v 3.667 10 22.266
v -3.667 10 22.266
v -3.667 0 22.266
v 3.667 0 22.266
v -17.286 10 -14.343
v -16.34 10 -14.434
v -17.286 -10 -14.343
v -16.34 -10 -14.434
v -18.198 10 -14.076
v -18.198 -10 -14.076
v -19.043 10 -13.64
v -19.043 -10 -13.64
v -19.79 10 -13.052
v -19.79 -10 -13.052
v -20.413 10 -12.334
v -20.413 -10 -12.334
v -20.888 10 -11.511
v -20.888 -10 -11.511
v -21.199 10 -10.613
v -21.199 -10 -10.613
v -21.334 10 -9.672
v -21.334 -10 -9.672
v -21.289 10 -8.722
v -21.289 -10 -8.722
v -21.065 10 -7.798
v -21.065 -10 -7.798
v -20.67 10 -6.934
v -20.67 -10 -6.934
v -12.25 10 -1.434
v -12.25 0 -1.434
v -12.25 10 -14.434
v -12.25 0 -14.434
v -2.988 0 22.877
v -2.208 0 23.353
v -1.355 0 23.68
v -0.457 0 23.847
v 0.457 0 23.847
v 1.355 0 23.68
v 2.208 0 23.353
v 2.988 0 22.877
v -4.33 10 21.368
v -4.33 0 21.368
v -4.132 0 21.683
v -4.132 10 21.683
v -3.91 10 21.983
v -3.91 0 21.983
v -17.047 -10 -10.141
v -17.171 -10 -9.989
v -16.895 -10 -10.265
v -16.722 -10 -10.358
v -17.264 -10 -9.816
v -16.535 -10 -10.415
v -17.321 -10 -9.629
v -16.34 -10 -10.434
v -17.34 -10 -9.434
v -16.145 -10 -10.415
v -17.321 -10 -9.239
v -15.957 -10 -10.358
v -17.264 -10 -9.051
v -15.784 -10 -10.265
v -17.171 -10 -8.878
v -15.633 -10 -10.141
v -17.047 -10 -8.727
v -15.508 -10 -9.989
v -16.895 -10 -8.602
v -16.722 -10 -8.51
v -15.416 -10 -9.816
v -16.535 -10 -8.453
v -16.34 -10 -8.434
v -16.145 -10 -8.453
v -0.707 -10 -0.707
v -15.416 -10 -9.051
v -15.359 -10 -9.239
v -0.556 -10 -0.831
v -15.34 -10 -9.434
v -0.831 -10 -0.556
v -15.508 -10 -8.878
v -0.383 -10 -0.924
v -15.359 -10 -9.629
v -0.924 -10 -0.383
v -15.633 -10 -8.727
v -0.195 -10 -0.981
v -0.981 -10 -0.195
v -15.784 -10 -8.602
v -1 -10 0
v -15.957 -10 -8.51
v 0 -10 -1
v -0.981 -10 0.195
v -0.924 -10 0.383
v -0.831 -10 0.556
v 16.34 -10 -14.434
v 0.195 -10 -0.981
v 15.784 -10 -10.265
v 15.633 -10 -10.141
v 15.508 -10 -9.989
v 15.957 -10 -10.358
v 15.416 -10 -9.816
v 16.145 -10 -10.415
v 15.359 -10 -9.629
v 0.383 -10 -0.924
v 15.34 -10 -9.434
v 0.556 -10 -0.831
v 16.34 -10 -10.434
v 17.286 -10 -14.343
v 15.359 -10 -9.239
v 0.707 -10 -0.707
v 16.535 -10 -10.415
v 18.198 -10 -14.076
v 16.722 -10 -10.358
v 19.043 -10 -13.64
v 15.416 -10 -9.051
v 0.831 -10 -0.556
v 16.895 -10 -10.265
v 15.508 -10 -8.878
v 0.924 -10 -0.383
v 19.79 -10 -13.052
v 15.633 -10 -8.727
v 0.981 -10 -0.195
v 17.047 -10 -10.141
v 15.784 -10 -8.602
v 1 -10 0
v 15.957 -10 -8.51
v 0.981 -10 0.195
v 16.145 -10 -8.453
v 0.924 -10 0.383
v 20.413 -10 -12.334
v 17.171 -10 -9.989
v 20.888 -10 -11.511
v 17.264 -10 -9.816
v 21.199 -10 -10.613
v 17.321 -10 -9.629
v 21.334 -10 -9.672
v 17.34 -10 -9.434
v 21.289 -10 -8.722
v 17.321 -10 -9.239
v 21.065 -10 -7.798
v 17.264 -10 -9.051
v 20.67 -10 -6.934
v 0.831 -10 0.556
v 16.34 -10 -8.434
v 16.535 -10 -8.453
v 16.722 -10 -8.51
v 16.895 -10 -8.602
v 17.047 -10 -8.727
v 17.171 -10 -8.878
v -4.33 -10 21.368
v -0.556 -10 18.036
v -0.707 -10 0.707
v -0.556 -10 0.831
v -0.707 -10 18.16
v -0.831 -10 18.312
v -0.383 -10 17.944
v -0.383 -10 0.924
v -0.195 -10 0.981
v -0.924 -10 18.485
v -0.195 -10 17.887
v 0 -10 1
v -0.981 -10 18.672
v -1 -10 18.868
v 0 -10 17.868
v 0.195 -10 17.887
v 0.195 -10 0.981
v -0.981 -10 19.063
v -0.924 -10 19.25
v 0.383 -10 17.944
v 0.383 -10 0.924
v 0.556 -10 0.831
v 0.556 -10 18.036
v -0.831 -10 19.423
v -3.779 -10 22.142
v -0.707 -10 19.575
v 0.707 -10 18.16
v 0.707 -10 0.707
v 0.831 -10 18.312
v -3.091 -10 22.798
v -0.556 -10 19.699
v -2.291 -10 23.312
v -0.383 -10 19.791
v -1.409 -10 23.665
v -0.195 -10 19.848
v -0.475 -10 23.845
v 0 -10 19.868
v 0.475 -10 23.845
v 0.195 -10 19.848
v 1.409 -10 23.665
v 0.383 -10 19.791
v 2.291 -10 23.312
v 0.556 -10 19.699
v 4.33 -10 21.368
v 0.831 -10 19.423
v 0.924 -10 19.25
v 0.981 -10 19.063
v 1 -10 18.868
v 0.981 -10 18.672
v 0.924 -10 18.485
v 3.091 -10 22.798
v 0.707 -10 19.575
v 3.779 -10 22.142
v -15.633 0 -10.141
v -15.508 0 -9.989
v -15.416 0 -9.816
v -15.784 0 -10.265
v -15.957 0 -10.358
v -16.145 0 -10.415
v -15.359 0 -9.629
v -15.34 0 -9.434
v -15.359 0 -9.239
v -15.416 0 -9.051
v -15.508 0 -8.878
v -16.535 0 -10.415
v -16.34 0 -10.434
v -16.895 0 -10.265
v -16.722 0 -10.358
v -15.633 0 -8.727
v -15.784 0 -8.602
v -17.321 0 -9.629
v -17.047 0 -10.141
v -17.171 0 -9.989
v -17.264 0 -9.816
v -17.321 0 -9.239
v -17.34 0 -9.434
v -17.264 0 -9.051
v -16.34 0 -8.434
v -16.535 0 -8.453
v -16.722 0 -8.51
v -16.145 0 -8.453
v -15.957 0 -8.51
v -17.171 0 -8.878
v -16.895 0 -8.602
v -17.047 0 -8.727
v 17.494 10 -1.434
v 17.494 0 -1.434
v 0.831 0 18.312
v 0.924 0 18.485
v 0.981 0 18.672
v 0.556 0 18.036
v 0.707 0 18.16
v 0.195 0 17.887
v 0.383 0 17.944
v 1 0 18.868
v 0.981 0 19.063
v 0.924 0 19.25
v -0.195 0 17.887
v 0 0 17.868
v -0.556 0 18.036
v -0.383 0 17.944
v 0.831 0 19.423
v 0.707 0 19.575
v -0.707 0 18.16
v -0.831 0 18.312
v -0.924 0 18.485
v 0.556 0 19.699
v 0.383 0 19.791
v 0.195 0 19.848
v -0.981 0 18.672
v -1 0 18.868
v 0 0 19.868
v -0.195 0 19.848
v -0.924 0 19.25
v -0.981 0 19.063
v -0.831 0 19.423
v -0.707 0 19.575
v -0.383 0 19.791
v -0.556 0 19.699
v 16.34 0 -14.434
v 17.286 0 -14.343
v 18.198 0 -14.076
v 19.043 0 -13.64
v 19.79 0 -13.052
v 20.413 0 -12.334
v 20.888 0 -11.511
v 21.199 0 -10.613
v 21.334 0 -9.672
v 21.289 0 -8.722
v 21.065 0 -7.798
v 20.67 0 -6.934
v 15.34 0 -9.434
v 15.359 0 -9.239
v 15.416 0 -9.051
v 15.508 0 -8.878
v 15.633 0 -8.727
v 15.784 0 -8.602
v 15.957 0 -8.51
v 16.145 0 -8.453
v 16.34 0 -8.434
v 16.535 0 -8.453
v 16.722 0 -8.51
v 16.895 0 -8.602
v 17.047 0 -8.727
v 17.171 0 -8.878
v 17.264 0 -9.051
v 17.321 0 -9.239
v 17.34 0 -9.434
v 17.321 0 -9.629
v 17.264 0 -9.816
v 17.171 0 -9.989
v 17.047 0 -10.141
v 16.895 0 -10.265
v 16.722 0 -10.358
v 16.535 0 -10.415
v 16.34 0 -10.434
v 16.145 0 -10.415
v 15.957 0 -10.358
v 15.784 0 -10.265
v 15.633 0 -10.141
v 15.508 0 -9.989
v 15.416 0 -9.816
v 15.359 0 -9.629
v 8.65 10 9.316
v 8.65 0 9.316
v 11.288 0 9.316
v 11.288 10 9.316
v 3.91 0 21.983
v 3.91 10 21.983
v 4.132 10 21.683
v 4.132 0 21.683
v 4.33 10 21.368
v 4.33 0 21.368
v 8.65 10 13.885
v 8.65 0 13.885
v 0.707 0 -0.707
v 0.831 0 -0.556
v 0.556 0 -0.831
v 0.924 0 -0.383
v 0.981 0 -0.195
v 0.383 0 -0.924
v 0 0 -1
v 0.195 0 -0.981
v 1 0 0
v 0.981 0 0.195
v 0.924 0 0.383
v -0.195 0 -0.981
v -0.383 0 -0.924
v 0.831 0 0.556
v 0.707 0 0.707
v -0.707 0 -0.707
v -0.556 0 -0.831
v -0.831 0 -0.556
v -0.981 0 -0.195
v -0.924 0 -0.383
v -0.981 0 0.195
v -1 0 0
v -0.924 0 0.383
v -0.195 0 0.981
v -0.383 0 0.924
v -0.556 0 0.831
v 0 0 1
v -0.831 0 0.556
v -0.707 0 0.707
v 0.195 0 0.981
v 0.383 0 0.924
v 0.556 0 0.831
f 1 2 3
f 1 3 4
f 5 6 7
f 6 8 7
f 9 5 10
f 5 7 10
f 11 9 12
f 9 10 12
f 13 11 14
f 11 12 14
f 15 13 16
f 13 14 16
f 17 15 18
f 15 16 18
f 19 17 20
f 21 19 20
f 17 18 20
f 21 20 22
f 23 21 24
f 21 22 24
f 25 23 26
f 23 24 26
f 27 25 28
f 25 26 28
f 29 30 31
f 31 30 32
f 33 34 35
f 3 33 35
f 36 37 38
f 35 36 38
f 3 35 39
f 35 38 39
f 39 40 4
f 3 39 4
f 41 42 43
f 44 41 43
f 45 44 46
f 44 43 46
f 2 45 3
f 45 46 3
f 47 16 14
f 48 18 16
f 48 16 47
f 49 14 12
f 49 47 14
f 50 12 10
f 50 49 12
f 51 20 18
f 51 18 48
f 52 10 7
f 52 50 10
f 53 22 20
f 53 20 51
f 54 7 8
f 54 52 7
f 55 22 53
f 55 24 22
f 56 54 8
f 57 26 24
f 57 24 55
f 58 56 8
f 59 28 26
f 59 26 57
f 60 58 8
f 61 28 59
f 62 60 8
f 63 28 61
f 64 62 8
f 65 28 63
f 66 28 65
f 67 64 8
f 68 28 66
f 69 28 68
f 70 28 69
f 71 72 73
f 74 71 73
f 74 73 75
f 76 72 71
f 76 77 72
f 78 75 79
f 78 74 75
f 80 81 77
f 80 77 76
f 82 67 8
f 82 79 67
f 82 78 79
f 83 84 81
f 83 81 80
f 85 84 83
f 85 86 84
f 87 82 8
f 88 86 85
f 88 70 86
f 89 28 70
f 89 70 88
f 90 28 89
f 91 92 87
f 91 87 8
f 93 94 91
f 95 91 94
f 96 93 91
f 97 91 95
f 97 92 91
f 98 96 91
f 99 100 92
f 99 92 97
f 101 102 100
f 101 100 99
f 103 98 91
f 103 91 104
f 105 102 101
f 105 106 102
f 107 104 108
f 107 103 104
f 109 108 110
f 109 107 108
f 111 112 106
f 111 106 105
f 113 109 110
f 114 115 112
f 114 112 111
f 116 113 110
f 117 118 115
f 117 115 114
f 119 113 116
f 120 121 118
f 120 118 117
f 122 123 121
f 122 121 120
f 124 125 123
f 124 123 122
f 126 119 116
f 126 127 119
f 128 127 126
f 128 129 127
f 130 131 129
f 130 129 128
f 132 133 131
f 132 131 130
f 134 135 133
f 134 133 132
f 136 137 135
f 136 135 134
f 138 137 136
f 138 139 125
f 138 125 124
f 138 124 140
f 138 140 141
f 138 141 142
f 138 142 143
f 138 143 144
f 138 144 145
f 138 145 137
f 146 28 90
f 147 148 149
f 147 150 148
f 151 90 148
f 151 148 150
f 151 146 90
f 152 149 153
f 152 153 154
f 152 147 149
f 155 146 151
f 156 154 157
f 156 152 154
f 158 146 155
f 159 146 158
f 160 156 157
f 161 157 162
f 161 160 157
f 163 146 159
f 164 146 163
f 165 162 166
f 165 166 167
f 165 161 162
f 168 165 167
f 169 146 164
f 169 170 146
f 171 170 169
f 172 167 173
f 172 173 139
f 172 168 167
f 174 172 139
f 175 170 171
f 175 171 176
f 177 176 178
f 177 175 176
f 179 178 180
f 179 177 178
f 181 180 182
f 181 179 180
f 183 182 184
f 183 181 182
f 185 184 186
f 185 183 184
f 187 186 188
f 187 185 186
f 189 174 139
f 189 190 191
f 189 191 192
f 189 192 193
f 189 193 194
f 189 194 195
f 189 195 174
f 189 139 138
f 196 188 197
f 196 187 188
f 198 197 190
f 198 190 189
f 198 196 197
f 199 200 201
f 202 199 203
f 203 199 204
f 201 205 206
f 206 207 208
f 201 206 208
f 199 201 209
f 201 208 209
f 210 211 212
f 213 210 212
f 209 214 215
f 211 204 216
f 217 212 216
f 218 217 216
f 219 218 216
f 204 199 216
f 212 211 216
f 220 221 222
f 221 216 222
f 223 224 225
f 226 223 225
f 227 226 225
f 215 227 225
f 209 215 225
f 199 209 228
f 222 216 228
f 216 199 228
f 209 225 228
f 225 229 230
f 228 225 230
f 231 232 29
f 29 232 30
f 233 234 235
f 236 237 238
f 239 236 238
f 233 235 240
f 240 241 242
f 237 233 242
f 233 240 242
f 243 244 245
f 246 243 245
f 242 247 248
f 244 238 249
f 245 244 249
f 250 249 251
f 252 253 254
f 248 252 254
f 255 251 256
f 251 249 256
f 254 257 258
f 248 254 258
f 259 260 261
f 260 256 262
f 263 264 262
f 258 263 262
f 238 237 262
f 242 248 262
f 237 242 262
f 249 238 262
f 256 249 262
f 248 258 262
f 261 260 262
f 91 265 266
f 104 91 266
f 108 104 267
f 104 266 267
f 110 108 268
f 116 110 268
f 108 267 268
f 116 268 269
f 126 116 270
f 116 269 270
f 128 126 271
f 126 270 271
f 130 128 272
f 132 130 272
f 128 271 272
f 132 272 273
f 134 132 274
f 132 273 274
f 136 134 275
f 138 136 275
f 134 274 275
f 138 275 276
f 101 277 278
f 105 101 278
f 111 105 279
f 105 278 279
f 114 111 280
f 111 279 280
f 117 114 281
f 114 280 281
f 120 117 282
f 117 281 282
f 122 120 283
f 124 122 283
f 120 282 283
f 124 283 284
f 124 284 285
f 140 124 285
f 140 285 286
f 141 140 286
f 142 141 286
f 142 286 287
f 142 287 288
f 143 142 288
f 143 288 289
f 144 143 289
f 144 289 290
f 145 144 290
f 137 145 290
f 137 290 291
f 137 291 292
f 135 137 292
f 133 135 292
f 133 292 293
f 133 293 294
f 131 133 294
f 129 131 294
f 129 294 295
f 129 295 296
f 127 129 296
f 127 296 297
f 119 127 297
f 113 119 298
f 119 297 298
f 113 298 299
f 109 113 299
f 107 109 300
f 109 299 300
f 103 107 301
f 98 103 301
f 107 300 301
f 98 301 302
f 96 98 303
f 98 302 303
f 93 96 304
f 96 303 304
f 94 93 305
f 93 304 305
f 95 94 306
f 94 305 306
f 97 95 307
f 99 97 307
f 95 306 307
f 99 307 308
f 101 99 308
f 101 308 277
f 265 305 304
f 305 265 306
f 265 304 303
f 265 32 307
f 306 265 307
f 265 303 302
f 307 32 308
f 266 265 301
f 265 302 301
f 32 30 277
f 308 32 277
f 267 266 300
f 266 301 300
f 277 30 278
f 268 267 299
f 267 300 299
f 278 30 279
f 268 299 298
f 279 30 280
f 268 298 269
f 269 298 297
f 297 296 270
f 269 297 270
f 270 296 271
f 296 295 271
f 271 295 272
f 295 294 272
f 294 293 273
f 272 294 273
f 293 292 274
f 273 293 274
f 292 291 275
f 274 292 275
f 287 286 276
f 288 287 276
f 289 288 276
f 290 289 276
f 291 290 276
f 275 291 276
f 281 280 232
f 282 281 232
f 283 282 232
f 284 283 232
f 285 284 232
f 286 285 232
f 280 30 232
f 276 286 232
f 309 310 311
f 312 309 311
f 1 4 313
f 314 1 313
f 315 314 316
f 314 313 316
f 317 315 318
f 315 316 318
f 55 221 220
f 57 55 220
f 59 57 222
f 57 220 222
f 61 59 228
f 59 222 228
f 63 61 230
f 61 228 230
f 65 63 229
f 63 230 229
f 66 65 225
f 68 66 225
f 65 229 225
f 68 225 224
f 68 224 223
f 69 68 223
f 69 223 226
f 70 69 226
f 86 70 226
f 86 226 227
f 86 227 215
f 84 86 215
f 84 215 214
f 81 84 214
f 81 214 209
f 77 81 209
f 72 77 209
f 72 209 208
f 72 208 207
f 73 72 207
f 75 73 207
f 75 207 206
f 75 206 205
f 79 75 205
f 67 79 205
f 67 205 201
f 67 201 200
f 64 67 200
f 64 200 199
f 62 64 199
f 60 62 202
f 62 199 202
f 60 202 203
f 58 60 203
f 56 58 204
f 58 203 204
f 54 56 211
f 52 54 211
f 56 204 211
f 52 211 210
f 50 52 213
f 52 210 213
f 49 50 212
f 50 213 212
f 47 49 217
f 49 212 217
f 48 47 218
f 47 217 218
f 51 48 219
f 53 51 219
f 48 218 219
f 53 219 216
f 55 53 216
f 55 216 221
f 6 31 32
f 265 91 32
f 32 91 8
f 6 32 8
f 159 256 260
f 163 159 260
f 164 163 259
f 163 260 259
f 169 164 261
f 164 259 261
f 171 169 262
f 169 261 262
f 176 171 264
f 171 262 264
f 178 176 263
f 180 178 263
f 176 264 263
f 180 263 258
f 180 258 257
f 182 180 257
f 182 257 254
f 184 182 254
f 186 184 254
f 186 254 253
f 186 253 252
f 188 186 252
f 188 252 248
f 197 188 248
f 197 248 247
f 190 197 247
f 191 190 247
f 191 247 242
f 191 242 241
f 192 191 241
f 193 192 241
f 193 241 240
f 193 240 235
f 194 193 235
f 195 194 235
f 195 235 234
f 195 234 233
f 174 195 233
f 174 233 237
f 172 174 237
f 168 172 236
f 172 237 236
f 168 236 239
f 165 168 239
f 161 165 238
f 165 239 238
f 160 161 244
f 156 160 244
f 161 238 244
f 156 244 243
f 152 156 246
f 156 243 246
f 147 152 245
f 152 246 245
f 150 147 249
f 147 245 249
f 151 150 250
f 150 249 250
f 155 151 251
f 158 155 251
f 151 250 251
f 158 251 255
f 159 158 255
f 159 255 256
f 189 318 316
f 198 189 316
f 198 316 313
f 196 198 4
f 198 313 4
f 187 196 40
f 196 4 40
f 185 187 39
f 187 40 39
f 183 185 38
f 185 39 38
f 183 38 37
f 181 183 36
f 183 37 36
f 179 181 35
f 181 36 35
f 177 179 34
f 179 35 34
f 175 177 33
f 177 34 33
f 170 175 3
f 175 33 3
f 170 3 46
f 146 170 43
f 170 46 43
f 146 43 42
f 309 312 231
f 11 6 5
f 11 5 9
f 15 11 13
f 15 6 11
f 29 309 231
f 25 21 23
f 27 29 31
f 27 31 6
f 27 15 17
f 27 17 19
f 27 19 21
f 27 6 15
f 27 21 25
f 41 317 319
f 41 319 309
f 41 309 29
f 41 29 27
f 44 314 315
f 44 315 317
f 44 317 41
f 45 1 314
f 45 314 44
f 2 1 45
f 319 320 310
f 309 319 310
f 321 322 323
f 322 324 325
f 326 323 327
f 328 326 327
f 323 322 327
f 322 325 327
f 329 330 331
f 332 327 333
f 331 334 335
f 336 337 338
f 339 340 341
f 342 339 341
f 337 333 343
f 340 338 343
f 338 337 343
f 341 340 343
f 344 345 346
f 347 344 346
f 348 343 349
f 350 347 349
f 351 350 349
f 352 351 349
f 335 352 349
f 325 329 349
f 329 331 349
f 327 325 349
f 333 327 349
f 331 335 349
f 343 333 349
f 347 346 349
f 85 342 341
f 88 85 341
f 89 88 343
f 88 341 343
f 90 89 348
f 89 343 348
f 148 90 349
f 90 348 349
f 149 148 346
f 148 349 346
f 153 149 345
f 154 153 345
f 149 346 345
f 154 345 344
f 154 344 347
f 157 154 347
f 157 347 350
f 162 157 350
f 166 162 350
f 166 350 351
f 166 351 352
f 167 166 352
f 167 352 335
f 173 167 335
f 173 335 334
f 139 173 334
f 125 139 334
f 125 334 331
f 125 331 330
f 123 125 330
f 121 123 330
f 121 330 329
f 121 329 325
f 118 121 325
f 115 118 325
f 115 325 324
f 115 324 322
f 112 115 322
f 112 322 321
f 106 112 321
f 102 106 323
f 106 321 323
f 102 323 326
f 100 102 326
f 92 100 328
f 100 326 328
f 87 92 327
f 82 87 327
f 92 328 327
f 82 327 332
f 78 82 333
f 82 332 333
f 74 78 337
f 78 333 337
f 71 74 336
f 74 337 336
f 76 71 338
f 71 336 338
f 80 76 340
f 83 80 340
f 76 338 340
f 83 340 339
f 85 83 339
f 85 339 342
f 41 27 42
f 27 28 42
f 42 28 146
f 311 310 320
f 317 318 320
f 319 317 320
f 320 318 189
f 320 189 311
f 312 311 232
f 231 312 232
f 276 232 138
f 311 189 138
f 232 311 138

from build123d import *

# Parameters (mm, degrees)
F1_DEPTH = 10
F3_D     = 2
F3_DEPTH = 12
F3_TIP   = 0.600860619
F4_R     = 1
F5_DEPTH = 10


with BuildPart() as f1:
    # F0 (on Front) → F1 (new body)
    with BuildSketch(Plane.XZ):
        with BuildLine():
            Line((-4.3301270189, 21.3675134595), (-20.6698729811, -6.9337567297))
            ThreePointArc((-20.6698729811, -6.9337567297), (-20.6698729811, -11.9337567297), (-16.3397459622, -14.4337567297))
            Line((-16.3397459622, -14.4337567297), (16.3397459622, -14.4337567297))
            ThreePointArc((16.3397459622, -14.4337567297), (20.6698729811, -11.9337567297), (20.6698729811, -6.9337567297))
            Line((20.6698729811, -6.9337567297), (4.3301270189, 21.3675134595))
            ThreePointArc((4.3301270189, 21.3675134595), (0, 23.8675134595), (-4.3301270189, 21.3675134595))
        make_face()
    extrude(amount=F1_DEPTH)

    # F3
    with Locations(Plane.XZ.offset(10)):
        with Locations((0, 18.8675134595), (0, 0), (16.3397459622, -9.4337567297), (-16.3397459622, -9.4337567297)):
            Hole(F3_D / 2, depth=F3_DEPTH)
            with Locations((0, 0, -(F3_DEPTH + F3_TIP / 2))):  # 118° drill point
                Cone(0, F3_D / 2, F3_TIP, mode=Mode.SUBTRACT)

    # F4 (on face) → F5 (join)
    with BuildSketch(Plane(origin=(0, 0, 0), x_dir=(-1, 0, 0), z_dir=(0, 1, 0))):
        with BuildLine():
            Line((-11.2879311067, 9.3162432703), (-17.4944465005, -1.4337567297))
            Line((-17.4944465005, -1.4337567297), (12.25, -1.4337567297))
            Line((12.25, -1.4337567297), (12.25, -14.4337567297))
            Line((12.25, -14.4337567297), (16.3397459622, -14.4337567297))
            ThreePointArc((16.3397459622, -14.4337567297), (20.6698729811, -11.9337567297), (20.6698729811, -6.9337567297))
            Line((20.6698729811, -6.9337567297), (4.3301270189, 21.3675134595))
            ThreePointArc((4.3301270189, 21.3675134595), (4.0238527859, 21.8354435053), (3.6672381533, 22.2662432703))
            Line((3.6672381533, 22.2662432703), (-3.6672381533, 22.2662432703))
            ThreePointArc((-3.6672381533, 22.2662432703), (-4.0238527859, 21.8354435053), (-4.3301270189, 21.3675134595))
            Line((-4.3301270189, 21.3675134595), (-8.65, 13.885273974))
            Line((-8.65, 13.885273974), (-8.65, 9.3162432703))
            Line((-8.65, 9.3162432703), (-11.2879311067, 9.3162432703))
        make_face()
        with Locations((16.3397459622, -9.4337567297)):
            Circle(F4_R, mode=Mode.SUBTRACT)
        Circle(F4_R, mode=Mode.SUBTRACT)
        with Locations((0, 18.8675134595)):
            Circle(F4_R, mode=Mode.SUBTRACT)
        with Locations((16.3397459622, -9.4337567297)):
            Circle(F4_R)
        Circle(F4_R)
        with Locations((0, 18.8675134595)):
            Circle(F4_R)
    extrude(amount=F5_DEPTH)


solid = f1.part
